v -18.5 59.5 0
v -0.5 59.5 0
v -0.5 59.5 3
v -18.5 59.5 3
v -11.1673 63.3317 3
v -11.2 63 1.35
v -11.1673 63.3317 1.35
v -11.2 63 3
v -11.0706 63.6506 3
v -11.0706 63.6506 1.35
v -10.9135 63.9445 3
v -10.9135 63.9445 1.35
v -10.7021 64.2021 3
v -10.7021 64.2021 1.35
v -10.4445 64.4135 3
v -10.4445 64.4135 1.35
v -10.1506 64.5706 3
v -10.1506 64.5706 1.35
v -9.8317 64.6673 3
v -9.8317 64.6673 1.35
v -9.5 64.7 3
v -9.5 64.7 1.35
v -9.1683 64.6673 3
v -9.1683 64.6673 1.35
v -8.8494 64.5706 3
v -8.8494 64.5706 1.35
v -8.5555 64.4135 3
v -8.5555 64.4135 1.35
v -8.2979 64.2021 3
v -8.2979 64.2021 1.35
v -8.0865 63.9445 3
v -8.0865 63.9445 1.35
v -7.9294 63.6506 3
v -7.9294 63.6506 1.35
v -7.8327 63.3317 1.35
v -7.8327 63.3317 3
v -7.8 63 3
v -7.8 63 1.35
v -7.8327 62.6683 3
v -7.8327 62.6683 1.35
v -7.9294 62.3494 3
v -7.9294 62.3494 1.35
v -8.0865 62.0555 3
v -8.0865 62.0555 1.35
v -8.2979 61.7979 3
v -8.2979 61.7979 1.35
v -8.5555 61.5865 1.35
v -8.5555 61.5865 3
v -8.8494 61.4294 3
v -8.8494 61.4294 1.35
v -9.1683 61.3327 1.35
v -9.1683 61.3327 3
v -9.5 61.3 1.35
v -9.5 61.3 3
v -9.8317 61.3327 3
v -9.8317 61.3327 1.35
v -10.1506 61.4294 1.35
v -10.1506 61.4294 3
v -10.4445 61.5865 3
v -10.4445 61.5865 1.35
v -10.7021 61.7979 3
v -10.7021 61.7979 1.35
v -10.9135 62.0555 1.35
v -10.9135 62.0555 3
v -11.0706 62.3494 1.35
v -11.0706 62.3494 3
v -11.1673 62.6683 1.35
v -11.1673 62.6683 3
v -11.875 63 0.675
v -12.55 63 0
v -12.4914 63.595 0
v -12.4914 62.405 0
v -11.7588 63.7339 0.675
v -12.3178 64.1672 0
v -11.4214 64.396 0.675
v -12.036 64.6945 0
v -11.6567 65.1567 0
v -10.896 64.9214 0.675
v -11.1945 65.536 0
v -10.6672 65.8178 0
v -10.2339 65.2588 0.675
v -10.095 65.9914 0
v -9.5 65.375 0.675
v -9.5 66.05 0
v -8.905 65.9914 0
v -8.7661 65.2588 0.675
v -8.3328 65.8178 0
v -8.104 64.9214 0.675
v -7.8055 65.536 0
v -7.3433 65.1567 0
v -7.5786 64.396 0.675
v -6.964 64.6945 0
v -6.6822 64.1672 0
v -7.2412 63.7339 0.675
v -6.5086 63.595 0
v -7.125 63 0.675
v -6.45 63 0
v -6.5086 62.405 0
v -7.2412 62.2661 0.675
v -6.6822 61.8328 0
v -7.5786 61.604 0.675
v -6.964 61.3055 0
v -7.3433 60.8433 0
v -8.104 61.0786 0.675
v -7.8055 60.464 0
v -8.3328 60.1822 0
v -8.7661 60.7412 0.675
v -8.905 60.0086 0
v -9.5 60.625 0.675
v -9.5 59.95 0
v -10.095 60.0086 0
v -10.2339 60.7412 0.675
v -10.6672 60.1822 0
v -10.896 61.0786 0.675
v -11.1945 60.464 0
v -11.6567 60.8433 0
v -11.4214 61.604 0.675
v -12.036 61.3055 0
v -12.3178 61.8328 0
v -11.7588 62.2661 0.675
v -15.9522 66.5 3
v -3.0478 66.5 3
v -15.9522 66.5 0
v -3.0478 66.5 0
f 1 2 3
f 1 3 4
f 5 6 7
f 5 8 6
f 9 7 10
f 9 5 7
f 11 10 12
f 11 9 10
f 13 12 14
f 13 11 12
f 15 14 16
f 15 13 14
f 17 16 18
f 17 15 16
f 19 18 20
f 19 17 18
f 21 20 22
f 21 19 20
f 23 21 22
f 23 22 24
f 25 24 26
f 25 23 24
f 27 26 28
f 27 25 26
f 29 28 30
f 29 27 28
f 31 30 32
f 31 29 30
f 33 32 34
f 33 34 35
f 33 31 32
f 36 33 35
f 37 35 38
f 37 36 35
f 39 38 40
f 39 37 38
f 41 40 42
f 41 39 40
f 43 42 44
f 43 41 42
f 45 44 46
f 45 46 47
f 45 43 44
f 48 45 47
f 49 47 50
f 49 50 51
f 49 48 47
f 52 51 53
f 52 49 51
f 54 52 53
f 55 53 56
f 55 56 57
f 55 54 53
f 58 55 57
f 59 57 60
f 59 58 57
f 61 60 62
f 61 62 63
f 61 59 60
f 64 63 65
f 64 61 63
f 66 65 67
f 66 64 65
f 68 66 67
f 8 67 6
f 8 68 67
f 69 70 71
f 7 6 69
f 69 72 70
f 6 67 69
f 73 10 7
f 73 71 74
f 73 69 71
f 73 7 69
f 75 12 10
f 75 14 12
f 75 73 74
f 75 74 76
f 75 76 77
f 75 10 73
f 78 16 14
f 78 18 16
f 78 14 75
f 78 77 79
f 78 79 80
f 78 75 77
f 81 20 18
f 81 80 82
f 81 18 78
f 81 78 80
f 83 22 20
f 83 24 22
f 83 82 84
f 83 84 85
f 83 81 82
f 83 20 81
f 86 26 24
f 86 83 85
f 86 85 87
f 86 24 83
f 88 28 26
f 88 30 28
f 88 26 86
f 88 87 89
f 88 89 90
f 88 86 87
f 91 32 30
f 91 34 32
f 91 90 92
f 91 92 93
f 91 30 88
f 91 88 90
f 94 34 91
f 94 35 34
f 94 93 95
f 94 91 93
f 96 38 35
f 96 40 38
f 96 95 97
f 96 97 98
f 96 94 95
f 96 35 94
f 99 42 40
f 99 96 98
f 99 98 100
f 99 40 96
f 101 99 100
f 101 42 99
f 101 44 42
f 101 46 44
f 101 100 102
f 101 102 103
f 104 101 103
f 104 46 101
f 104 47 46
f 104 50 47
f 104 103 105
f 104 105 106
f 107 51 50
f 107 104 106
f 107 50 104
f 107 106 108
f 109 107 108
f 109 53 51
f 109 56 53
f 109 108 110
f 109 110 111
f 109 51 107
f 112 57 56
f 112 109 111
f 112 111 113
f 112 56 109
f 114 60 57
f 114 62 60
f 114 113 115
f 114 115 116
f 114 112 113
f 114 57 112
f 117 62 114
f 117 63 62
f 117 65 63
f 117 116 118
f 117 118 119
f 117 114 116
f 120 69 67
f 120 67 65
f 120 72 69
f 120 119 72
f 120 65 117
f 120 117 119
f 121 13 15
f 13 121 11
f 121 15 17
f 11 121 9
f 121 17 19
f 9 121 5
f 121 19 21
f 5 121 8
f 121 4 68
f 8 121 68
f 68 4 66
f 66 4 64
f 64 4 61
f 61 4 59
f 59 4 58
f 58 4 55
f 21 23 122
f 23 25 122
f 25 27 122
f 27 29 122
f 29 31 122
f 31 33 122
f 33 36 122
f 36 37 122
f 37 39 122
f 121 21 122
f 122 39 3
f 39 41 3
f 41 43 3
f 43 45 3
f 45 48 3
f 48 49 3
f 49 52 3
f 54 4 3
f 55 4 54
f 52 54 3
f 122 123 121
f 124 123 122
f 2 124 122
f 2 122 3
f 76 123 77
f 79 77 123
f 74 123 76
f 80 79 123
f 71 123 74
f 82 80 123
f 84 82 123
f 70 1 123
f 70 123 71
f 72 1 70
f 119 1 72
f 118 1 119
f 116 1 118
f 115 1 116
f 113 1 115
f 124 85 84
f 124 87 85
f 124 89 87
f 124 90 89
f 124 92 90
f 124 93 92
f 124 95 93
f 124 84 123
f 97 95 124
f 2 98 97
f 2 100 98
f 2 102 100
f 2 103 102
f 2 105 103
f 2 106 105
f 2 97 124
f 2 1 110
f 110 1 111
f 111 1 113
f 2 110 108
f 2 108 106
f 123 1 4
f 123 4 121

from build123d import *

# Parameters (mm, degrees)
PAD013_DEPTH        = 3
HOLE012_D           = 3.4
HOLE012_DEPTH       = 25
HOLE012_CSINK_D     = 6.1
HOLE012_CSINK_ANGLE = 90


with BuildPart() as body020:
    # Sketch042 (on Face1 of Binder029) → Pad013 (new body)
    with BuildSketch(Plane.XY):
        Polygon((-18.5, -59.5), (-15.952208, -66.5), (-3.047792, -66.5), (-0.5, -59.5), align=None)
    extrude(amount=PAD013_DEPTH)

    # Hole012
    with Locations(Plane(origin=(0, 0, 0), x_dir=(1, 0, 0), z_dir=(0, 0, -1))):
        with Locations((-9.5, 63)):
            CounterSinkHole(HOLE012_D / 2, HOLE012_CSINK_D / 2, depth=HOLE012_DEPTH, counter_sink_angle=HOLE012_CSINK_ANGLE)


with BuildPart() as part_mirroring:
    # Part__Mirroring: instance of Body020
    add(body020.part.mirror(Plane(origin=(0, 0, 0), x_dir=(1, 0, 0), z_dir=(0, 1, 0))))


solid = part_mirroring.part
